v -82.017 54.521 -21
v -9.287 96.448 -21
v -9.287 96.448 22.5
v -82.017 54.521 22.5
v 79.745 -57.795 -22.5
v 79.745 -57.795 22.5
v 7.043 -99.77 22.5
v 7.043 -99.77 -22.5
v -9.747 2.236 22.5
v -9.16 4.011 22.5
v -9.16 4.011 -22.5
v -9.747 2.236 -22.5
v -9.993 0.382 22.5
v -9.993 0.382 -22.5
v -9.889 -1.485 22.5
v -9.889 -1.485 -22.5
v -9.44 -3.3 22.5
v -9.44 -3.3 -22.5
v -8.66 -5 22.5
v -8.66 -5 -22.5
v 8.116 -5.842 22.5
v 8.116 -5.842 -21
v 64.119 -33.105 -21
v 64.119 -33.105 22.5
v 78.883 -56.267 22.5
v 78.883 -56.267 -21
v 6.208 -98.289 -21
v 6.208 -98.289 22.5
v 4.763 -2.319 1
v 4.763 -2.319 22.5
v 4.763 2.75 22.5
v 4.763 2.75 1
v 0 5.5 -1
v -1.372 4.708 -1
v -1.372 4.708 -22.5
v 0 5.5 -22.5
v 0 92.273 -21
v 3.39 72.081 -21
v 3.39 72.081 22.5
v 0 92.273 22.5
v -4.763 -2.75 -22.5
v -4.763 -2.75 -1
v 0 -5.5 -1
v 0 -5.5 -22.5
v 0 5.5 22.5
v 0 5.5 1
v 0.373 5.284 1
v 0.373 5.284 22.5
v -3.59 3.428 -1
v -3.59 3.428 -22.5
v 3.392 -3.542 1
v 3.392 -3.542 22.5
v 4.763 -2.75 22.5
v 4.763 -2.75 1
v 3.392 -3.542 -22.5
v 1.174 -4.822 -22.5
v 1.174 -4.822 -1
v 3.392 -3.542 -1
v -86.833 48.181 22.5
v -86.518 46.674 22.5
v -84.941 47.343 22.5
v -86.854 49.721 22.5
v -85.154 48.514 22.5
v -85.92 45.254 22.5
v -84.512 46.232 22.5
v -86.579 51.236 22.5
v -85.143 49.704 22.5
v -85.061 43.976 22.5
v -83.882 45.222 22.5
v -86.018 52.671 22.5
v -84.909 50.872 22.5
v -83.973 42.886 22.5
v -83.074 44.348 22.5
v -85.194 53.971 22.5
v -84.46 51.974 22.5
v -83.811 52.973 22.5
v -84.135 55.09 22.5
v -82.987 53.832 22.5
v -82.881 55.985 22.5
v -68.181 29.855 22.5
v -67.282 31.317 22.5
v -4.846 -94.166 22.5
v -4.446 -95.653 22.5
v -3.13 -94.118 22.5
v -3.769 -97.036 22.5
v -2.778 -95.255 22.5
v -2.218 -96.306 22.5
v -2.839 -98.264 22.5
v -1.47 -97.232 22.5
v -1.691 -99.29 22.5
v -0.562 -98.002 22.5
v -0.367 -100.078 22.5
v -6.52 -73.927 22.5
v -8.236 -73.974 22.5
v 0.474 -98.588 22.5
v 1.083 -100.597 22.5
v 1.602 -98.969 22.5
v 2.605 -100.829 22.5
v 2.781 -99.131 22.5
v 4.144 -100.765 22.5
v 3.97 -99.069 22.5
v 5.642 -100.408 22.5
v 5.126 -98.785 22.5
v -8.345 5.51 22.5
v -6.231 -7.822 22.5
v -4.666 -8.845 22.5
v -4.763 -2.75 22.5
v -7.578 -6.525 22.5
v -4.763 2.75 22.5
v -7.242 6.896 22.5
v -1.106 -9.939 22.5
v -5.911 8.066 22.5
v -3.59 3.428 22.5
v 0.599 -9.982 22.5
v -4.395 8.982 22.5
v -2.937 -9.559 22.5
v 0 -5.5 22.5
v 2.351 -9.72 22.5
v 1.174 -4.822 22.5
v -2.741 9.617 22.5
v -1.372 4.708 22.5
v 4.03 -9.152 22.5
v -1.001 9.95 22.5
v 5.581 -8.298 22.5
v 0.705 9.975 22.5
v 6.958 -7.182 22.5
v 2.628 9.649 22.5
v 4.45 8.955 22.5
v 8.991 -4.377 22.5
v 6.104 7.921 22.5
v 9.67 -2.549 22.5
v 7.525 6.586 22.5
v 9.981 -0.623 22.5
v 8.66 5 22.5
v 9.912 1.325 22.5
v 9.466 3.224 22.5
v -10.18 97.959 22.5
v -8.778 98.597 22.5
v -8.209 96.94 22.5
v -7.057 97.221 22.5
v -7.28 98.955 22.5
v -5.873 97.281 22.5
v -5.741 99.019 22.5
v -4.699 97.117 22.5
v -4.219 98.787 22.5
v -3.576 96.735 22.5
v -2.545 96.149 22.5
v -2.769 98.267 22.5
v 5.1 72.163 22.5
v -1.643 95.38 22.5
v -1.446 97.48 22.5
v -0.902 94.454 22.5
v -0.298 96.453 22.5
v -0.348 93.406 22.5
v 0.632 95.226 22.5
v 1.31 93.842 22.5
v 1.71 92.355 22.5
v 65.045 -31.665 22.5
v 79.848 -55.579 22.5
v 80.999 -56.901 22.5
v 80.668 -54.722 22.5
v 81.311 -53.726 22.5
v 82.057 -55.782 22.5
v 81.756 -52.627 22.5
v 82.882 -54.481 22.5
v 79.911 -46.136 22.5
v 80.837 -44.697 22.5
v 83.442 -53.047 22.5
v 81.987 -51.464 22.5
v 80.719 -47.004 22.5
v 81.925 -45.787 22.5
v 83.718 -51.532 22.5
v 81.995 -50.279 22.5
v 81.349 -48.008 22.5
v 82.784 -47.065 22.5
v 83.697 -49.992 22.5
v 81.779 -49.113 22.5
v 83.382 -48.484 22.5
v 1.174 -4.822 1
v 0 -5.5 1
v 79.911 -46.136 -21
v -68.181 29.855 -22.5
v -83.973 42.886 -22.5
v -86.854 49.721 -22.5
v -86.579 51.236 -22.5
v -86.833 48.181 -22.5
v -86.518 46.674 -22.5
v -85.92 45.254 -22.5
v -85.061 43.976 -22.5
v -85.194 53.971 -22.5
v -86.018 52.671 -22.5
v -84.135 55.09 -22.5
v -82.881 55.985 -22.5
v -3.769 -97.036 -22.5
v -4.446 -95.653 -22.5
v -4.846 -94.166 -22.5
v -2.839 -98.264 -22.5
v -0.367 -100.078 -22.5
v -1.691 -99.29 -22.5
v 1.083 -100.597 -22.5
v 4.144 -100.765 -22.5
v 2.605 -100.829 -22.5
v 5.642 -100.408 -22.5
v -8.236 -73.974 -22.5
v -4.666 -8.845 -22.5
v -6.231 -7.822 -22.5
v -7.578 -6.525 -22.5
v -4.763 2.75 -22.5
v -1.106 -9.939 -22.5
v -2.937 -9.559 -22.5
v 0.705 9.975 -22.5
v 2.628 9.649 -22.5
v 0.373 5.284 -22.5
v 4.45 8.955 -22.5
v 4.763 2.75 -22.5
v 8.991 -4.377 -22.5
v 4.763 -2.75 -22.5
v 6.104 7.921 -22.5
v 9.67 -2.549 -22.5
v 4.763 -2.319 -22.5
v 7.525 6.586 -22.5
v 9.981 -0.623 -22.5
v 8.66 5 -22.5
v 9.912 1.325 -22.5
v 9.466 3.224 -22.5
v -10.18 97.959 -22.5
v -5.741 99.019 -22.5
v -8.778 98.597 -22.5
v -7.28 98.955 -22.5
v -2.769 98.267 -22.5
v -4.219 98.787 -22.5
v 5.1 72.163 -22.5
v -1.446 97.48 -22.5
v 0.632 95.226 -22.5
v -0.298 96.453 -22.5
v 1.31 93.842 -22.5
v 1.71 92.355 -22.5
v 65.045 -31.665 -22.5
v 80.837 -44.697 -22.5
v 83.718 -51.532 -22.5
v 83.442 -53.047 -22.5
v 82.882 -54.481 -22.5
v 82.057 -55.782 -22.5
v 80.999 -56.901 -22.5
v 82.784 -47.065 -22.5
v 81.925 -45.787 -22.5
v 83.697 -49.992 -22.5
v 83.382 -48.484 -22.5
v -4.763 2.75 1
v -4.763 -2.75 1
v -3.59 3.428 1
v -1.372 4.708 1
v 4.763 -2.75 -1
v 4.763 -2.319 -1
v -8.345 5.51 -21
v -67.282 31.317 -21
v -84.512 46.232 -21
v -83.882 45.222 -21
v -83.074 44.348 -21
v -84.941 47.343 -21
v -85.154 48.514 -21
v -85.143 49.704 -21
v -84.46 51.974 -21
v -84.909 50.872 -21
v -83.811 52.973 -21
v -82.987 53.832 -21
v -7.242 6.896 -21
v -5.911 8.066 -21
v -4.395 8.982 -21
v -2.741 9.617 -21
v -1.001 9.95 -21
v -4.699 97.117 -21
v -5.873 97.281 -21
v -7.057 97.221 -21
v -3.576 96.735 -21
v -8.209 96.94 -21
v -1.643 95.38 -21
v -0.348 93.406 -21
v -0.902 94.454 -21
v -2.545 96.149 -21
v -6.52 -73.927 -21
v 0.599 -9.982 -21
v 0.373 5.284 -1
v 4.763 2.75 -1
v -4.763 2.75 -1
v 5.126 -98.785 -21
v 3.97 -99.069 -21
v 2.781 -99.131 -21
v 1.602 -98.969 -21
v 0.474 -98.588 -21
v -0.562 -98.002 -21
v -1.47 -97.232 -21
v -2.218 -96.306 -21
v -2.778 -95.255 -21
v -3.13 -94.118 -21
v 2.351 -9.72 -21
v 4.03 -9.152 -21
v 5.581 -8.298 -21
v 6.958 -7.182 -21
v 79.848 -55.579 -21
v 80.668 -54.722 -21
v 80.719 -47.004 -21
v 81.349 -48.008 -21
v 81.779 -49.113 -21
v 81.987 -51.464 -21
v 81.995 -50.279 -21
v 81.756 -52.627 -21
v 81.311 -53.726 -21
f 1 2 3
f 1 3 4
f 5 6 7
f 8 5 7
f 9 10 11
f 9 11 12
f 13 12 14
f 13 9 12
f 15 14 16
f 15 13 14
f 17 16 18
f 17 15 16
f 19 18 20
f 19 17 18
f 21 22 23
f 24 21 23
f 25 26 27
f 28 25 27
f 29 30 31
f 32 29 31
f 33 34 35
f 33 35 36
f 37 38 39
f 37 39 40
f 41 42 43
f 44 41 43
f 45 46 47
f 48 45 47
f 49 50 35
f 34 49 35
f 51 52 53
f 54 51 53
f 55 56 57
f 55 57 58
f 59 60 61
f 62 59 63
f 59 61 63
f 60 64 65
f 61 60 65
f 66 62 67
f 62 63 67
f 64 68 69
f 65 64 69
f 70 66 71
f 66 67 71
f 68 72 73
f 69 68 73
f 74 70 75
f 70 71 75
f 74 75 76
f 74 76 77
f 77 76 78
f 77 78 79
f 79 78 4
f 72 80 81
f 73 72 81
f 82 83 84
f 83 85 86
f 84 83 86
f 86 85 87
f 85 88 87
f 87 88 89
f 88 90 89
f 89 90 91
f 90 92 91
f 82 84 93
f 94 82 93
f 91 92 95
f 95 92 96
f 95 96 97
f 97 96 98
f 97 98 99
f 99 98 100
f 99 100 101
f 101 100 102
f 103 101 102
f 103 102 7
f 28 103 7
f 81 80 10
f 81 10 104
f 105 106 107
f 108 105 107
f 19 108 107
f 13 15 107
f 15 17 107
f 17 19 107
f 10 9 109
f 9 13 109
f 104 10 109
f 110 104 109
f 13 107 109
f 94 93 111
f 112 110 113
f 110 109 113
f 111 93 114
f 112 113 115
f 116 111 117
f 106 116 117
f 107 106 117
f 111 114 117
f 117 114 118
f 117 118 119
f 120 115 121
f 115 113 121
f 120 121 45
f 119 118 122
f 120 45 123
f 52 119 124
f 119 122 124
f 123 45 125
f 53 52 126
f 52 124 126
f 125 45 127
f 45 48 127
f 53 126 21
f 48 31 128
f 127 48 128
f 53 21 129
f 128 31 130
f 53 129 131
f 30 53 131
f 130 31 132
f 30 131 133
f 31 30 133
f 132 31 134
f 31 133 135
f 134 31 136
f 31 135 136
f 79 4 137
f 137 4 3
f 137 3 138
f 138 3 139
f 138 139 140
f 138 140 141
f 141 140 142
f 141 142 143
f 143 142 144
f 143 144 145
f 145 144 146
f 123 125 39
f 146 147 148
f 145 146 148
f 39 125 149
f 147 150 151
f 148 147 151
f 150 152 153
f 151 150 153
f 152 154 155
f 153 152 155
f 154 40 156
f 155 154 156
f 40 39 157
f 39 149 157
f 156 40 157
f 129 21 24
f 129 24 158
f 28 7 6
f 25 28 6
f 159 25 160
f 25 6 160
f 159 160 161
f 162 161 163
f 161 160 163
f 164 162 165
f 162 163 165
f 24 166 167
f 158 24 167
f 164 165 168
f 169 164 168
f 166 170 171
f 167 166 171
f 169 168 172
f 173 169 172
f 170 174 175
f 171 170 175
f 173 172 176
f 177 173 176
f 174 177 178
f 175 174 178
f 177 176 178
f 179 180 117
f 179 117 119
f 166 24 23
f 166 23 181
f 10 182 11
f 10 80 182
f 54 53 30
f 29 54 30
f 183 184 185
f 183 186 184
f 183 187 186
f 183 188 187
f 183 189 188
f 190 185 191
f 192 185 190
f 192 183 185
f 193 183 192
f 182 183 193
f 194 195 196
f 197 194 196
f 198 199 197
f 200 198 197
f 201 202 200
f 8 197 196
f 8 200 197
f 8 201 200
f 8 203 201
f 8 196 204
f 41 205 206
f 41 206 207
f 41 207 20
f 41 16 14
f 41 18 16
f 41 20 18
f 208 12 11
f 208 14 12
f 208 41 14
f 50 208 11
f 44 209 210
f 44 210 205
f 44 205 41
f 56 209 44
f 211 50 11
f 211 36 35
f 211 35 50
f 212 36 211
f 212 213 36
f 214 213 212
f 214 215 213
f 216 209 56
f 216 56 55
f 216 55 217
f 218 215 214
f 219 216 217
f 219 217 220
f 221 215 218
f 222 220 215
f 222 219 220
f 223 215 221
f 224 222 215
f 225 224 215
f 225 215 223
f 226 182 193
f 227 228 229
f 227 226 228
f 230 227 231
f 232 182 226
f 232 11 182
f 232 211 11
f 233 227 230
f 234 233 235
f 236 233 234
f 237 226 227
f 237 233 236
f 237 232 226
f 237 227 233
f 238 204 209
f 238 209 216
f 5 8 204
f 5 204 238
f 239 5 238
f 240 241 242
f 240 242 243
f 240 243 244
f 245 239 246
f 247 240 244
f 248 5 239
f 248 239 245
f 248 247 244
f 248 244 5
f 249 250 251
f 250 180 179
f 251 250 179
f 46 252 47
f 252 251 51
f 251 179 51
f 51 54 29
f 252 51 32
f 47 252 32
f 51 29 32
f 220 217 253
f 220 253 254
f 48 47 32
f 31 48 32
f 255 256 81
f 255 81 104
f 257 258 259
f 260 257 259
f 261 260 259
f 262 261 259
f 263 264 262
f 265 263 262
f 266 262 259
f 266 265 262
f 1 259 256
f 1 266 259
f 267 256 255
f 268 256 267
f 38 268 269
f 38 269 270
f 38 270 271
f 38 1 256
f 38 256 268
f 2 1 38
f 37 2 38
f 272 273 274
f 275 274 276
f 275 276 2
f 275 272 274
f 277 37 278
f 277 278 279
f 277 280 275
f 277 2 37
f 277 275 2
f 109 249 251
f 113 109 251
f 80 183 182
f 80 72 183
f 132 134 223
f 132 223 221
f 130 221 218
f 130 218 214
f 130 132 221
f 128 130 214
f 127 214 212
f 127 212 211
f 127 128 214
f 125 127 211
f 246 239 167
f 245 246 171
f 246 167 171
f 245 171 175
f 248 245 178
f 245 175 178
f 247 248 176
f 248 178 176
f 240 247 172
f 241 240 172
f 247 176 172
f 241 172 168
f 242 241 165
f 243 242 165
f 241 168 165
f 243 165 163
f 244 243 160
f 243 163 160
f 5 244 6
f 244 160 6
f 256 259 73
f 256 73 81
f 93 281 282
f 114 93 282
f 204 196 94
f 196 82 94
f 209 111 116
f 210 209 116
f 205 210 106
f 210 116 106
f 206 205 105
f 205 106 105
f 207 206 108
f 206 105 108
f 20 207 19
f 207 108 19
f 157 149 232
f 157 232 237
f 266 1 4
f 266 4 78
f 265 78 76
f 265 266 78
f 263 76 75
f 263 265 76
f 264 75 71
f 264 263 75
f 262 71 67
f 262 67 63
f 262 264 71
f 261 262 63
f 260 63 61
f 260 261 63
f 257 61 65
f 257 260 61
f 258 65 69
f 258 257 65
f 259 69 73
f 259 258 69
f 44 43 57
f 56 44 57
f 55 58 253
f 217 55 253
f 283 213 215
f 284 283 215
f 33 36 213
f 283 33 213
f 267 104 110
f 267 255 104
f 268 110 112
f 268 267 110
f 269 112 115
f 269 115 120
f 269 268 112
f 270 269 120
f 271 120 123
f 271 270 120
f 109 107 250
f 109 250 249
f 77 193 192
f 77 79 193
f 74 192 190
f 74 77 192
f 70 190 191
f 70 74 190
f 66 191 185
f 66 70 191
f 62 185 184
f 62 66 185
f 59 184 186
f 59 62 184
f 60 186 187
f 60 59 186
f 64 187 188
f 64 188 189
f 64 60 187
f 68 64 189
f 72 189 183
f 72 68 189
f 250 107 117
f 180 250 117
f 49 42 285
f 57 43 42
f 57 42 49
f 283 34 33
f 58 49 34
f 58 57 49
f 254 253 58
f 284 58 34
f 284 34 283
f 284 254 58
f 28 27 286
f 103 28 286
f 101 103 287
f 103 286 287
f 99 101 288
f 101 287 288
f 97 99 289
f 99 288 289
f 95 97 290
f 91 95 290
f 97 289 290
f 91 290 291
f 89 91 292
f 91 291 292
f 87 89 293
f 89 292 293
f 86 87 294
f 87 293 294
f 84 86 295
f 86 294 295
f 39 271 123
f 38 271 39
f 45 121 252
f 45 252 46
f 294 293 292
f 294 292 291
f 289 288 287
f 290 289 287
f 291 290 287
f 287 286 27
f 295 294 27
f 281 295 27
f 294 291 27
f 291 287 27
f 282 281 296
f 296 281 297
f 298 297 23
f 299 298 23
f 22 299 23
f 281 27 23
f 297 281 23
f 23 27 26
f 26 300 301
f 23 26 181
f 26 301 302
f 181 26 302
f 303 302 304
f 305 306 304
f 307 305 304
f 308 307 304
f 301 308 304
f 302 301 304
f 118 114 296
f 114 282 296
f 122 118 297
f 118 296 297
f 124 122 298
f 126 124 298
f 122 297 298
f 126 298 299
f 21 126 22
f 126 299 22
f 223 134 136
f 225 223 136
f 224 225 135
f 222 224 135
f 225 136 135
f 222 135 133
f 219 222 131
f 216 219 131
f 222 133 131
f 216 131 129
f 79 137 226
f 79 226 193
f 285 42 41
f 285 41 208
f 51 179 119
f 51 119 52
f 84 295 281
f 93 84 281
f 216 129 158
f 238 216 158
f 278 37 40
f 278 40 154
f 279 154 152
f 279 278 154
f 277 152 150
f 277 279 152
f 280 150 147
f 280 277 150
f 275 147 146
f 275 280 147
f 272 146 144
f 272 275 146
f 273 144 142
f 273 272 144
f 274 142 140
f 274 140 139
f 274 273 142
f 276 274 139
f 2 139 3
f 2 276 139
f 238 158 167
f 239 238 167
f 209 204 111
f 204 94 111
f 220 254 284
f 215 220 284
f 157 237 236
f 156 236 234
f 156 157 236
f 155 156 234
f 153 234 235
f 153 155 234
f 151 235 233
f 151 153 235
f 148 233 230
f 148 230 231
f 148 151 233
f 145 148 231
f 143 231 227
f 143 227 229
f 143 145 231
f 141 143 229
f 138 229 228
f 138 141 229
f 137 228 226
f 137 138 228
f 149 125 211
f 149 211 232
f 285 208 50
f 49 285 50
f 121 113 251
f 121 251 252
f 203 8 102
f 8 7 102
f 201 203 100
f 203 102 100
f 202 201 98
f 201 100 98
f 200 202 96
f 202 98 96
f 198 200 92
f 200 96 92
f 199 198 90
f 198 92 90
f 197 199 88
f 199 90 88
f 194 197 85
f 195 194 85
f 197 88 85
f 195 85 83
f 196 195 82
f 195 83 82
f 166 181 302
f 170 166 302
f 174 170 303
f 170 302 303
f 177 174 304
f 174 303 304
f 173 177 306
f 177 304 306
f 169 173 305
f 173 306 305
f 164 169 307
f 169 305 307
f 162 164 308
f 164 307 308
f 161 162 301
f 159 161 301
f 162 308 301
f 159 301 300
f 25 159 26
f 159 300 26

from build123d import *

# Parameters (mm, degrees)
F1_DEPTH = 22.5
F2_DEPTH = 22.5
F3_DEPTH = 21
F4_DEPTH = 1


# Not quite as in the source:
# - a feature names something its author has since deleted; it is built from what else it names


with BuildPart() as f1:
    # F0 (on Top) → F1 (new body, symmetric)
    with BuildSketch(Plane.XY):
        with BuildLine():
            Line((0.7049133584, 9.9751239169), (5.0995821323, 72.1634270217))
            Line((5.0995821323, 72.1634270217), (1.7099698283, 92.3552620466))
            ThreePointArc((1.7099698283, 92.3552620466), (-2.7689436701, 98.2673473553), (-10.179636045, 97.9590336386))
            Line((-10.179636045, 97.9590336386), (-82.8813710016, 55.9846673909))
            ThreePointArc((-82.8813710016, 55.9846673909), (-86.8537247, 49.720976393), (-83.9731653825, 42.8860808677))
            Line((-83.9731653825, 42.8860808677), (-68.1813294539, 29.8546729909))
            Line((-68.1813294539, 29.8546729909), (-9.1603226635, 4.0110458362))
            ThreePointArc((-9.1603226635, 4.0110458362), (-8.784741138, 4.7778994482), (-8.3451077857, 5.5099161558))
            Line((-8.3451077857, 5.5099161558), (-67.2822264653, 31.3168110829))
            Line((-67.2822264653, 31.3168110829), (-83.0737799078, 44.3479858524))
            ThreePointArc((-83.0737799078, 44.3479858524), (-85.1427917644, 49.7044488576), (-82.0166193538, 54.5210401885))
            Line((-82.0166193538, 54.5210401885), (-9.2869651685, 96.4475473538))
            ThreePointArc((-9.2869651685, 96.4475473538), (-3.5761256796, 96.734734482), (0, 92.2729535329))
            Line((0, 92.2729535329), (3.3895516703, 72.0814797017))
            Line((3.3895516703, 72.0814797017), (-1.0011183824, 9.9497619059))
            ThreePointArc((-1.0011183824, 9.9497619059), (-0.1486444145, 9.9988951809), (0.7049133584, 9.9751239169))
        make_face()
        with BuildLine():
            ThreePointArc((-9.1603226635, 4.0110458362), (-9.9846369617, -0.554098134), (-8.6602540378, -5))
            Line((-8.6602540378, -5), (-4.7631397208, -2.75))
            Line((-4.7631397208, -2.75), (-4.7631397208, 2.0856439719))
            Line((-4.7631397208, 2.0856439719), (-9.1603226635, 4.0110458362))
        make_face()
        with BuildLine():
            Line((4.7631397208, 2.75), (8.6602540378, 5))
            ThreePointArc((8.6602540378, 5), (5.3023159645, 8.4785284934), (0.7049133584, 9.9751239169))
            Line((0.7049133584, 9.9751239169), (0.373433245, 5.2843982155))
            Line((0.373433245, 5.2843982155), (4.7631397208, 2.75))
        make_face()
        with BuildLine():
            Line((-1.3715281953, 4.7081478273), (-1.0011183824, 9.9497619059))
            ThreePointArc((-1.0011183824, 9.9497619059), (-5.1735909645, 8.5576840636), (-8.3451077857, 5.5099161558))
            Line((-8.3451077857, 5.5099161558), (-3.589530539, 3.4275835771))
            Line((-3.589530539, 3.4275835771), (-1.3715281953, 4.7081478273))
        make_face()
        with BuildLine():
            Line((0.373433245, 5.2843982155), (0.7049133584, 9.9751239169))
            ThreePointArc((0.7049133584, 9.9751239169), (-0.1486444145, 9.9988951809), (-1.0011183824, 9.9497619059))
            Line((-1.0011183824, 9.9497619059), (-1.3715281953, 4.7081478273))
            Line((-1.3715281953, 4.7081478273), (0, 5.5))
            Line((0, 5.5), (0.373433245, 5.2843982155))
        make_face()
        with BuildLine():
            ThreePointArc((-8.3451077857, 5.5099161558), (-8.784741138, 4.7778994482), (-9.1603226635, 4.0110458362))
            Line((-9.1603226635, 4.0110458362), (-4.7631397208, 2.0856439719))
            Line((-4.7631397208, 2.0856439719), (-4.7631397208, 2.75))
            Line((-4.7631397208, 2.75), (-3.589530539, 3.4275835771))
            Line((-3.589530539, 3.4275835771), (-8.3451077857, 5.5099161558))
        make_face()
        with BuildLine():
            ThreePointArc((-8.3451077857, 5.5099161558), (-5.1735909645, 8.5576840636), (-1.0011183824, 9.9497619059))
            Line((-1.0011183824, 9.9497619059), (3.3895516703, 72.0814797017))
            Line((3.3895516703, 72.0814797017), (0, 92.2729535329))
            ThreePointArc((0, 92.2729535329), (-3.5761256796, 96.734734482), (-9.2869651685, 96.4475473538))
            Line((-9.2869651685, 96.4475473538), (-82.0166193538, 54.5210401885))
            ThreePointArc((-82.0166193538, 54.5210401885), (-85.1427917644, 49.7044488576), (-83.0737799078, 44.3479858524))
            Line((-83.0737799078, 44.3479858524), (-67.2822264653, 31.3168110829))
            Line((-67.2822264653, 31.3168110829), (-8.3451077857, 5.5099161558))
        make_face()
    extrude(amount=F1_DEPTH, both=True)

    # F0 (on Top) → F2 (cut, through all)
    with BuildSketch(Plane.XY):
        with BuildLine():
            ThreePointArc((-8.3451077857, 5.5099161558), (-5.1735909645, 8.5576840636), (-1.0011183824, 9.9497619059))
            Line((-1.0011183824, 9.9497619059), (3.3895516703, 72.0814797017))
            Line((3.3895516703, 72.0814797017), (0, 92.2729535329))
            ThreePointArc((0, 92.2729535329), (-3.5761256796, 96.734734482), (-9.2869651685, 96.4475473538))
            Line((-9.2869651685, 96.4475473538), (-82.0166193538, 54.5210401885))
            ThreePointArc((-82.0166193538, 54.5210401885), (-85.1427917644, 49.7044488576), (-83.0737799078, 44.3479858524))
            Line((-83.0737799078, 44.3479858524), (-67.2822264653, 31.3168110829))
            Line((-67.2822264653, 31.3168110829), (-8.3451077857, 5.5099161558))
        make_face()
    extrude(amount=F2_DEPTH, mode=Mode.SUBTRACT)

    # F0 (on Top) → F3 (cut)
    with BuildSketch(Plane.XY):
        with BuildLine():
            ThreePointArc((-8.3451077857, 5.5099161558), (-5.1735909645, 8.5576840636), (-1.0011183824, 9.9497619059))
            Line((-1.0011183824, 9.9497619059), (3.3895516703, 72.0814797017))
            Line((3.3895516703, 72.0814797017), (0, 92.2729535329))
            ThreePointArc((0, 92.2729535329), (-3.5761256796, 96.734734482), (-9.2869651685, 96.4475473538))
            Line((-9.2869651685, 96.4475473538), (-82.0166193538, 54.5210401885))
            ThreePointArc((-82.0166193538, 54.5210401885), (-85.1427917644, 49.7044488576), (-83.0737799078, 44.3479858524))
            Line((-83.0737799078, 44.3479858524), (-67.2822264653, 31.3168110829))
            Line((-67.2822264653, 31.3168110829), (-8.3451077857, 5.5099161558))
        make_face()
    extrude(amount=-F3_DEPTH, mode=Mode.SUBTRACT)

    # F0 (on Top) → F4 (join, symmetric)
    with BuildSketch(Plane.XY):
        Polygon((-4.7631397208, 2.0856439719), (0, 0), (0.373433245, 5.2843982155), (0, 5.5), (-1.3715281953, 4.7081478273), (-3.589530539, 3.4275835771), (-4.7631397208, 2.75), align=None)
        Polygon((0, 0), (4.7631397208, 2.75), (0.373433245, 5.2843982155), align=None)
        Polygon((-4.7631397208, 2.0856439719), (-4.7631397208, -2.75), (0, 0), align=None)
    extrude(amount=F4_DEPTH, both=True)

    # F5: F1 across face


with BuildPart() as f1_1:
    add(f1.part)
    add(f1.part.mirror(Plane(origin=(0, 0, 0), x_dir=(0.8660254038, 0.5, 0), z_dir=(0.5, -0.8660254038, 0))))


solid = f1_1.part
